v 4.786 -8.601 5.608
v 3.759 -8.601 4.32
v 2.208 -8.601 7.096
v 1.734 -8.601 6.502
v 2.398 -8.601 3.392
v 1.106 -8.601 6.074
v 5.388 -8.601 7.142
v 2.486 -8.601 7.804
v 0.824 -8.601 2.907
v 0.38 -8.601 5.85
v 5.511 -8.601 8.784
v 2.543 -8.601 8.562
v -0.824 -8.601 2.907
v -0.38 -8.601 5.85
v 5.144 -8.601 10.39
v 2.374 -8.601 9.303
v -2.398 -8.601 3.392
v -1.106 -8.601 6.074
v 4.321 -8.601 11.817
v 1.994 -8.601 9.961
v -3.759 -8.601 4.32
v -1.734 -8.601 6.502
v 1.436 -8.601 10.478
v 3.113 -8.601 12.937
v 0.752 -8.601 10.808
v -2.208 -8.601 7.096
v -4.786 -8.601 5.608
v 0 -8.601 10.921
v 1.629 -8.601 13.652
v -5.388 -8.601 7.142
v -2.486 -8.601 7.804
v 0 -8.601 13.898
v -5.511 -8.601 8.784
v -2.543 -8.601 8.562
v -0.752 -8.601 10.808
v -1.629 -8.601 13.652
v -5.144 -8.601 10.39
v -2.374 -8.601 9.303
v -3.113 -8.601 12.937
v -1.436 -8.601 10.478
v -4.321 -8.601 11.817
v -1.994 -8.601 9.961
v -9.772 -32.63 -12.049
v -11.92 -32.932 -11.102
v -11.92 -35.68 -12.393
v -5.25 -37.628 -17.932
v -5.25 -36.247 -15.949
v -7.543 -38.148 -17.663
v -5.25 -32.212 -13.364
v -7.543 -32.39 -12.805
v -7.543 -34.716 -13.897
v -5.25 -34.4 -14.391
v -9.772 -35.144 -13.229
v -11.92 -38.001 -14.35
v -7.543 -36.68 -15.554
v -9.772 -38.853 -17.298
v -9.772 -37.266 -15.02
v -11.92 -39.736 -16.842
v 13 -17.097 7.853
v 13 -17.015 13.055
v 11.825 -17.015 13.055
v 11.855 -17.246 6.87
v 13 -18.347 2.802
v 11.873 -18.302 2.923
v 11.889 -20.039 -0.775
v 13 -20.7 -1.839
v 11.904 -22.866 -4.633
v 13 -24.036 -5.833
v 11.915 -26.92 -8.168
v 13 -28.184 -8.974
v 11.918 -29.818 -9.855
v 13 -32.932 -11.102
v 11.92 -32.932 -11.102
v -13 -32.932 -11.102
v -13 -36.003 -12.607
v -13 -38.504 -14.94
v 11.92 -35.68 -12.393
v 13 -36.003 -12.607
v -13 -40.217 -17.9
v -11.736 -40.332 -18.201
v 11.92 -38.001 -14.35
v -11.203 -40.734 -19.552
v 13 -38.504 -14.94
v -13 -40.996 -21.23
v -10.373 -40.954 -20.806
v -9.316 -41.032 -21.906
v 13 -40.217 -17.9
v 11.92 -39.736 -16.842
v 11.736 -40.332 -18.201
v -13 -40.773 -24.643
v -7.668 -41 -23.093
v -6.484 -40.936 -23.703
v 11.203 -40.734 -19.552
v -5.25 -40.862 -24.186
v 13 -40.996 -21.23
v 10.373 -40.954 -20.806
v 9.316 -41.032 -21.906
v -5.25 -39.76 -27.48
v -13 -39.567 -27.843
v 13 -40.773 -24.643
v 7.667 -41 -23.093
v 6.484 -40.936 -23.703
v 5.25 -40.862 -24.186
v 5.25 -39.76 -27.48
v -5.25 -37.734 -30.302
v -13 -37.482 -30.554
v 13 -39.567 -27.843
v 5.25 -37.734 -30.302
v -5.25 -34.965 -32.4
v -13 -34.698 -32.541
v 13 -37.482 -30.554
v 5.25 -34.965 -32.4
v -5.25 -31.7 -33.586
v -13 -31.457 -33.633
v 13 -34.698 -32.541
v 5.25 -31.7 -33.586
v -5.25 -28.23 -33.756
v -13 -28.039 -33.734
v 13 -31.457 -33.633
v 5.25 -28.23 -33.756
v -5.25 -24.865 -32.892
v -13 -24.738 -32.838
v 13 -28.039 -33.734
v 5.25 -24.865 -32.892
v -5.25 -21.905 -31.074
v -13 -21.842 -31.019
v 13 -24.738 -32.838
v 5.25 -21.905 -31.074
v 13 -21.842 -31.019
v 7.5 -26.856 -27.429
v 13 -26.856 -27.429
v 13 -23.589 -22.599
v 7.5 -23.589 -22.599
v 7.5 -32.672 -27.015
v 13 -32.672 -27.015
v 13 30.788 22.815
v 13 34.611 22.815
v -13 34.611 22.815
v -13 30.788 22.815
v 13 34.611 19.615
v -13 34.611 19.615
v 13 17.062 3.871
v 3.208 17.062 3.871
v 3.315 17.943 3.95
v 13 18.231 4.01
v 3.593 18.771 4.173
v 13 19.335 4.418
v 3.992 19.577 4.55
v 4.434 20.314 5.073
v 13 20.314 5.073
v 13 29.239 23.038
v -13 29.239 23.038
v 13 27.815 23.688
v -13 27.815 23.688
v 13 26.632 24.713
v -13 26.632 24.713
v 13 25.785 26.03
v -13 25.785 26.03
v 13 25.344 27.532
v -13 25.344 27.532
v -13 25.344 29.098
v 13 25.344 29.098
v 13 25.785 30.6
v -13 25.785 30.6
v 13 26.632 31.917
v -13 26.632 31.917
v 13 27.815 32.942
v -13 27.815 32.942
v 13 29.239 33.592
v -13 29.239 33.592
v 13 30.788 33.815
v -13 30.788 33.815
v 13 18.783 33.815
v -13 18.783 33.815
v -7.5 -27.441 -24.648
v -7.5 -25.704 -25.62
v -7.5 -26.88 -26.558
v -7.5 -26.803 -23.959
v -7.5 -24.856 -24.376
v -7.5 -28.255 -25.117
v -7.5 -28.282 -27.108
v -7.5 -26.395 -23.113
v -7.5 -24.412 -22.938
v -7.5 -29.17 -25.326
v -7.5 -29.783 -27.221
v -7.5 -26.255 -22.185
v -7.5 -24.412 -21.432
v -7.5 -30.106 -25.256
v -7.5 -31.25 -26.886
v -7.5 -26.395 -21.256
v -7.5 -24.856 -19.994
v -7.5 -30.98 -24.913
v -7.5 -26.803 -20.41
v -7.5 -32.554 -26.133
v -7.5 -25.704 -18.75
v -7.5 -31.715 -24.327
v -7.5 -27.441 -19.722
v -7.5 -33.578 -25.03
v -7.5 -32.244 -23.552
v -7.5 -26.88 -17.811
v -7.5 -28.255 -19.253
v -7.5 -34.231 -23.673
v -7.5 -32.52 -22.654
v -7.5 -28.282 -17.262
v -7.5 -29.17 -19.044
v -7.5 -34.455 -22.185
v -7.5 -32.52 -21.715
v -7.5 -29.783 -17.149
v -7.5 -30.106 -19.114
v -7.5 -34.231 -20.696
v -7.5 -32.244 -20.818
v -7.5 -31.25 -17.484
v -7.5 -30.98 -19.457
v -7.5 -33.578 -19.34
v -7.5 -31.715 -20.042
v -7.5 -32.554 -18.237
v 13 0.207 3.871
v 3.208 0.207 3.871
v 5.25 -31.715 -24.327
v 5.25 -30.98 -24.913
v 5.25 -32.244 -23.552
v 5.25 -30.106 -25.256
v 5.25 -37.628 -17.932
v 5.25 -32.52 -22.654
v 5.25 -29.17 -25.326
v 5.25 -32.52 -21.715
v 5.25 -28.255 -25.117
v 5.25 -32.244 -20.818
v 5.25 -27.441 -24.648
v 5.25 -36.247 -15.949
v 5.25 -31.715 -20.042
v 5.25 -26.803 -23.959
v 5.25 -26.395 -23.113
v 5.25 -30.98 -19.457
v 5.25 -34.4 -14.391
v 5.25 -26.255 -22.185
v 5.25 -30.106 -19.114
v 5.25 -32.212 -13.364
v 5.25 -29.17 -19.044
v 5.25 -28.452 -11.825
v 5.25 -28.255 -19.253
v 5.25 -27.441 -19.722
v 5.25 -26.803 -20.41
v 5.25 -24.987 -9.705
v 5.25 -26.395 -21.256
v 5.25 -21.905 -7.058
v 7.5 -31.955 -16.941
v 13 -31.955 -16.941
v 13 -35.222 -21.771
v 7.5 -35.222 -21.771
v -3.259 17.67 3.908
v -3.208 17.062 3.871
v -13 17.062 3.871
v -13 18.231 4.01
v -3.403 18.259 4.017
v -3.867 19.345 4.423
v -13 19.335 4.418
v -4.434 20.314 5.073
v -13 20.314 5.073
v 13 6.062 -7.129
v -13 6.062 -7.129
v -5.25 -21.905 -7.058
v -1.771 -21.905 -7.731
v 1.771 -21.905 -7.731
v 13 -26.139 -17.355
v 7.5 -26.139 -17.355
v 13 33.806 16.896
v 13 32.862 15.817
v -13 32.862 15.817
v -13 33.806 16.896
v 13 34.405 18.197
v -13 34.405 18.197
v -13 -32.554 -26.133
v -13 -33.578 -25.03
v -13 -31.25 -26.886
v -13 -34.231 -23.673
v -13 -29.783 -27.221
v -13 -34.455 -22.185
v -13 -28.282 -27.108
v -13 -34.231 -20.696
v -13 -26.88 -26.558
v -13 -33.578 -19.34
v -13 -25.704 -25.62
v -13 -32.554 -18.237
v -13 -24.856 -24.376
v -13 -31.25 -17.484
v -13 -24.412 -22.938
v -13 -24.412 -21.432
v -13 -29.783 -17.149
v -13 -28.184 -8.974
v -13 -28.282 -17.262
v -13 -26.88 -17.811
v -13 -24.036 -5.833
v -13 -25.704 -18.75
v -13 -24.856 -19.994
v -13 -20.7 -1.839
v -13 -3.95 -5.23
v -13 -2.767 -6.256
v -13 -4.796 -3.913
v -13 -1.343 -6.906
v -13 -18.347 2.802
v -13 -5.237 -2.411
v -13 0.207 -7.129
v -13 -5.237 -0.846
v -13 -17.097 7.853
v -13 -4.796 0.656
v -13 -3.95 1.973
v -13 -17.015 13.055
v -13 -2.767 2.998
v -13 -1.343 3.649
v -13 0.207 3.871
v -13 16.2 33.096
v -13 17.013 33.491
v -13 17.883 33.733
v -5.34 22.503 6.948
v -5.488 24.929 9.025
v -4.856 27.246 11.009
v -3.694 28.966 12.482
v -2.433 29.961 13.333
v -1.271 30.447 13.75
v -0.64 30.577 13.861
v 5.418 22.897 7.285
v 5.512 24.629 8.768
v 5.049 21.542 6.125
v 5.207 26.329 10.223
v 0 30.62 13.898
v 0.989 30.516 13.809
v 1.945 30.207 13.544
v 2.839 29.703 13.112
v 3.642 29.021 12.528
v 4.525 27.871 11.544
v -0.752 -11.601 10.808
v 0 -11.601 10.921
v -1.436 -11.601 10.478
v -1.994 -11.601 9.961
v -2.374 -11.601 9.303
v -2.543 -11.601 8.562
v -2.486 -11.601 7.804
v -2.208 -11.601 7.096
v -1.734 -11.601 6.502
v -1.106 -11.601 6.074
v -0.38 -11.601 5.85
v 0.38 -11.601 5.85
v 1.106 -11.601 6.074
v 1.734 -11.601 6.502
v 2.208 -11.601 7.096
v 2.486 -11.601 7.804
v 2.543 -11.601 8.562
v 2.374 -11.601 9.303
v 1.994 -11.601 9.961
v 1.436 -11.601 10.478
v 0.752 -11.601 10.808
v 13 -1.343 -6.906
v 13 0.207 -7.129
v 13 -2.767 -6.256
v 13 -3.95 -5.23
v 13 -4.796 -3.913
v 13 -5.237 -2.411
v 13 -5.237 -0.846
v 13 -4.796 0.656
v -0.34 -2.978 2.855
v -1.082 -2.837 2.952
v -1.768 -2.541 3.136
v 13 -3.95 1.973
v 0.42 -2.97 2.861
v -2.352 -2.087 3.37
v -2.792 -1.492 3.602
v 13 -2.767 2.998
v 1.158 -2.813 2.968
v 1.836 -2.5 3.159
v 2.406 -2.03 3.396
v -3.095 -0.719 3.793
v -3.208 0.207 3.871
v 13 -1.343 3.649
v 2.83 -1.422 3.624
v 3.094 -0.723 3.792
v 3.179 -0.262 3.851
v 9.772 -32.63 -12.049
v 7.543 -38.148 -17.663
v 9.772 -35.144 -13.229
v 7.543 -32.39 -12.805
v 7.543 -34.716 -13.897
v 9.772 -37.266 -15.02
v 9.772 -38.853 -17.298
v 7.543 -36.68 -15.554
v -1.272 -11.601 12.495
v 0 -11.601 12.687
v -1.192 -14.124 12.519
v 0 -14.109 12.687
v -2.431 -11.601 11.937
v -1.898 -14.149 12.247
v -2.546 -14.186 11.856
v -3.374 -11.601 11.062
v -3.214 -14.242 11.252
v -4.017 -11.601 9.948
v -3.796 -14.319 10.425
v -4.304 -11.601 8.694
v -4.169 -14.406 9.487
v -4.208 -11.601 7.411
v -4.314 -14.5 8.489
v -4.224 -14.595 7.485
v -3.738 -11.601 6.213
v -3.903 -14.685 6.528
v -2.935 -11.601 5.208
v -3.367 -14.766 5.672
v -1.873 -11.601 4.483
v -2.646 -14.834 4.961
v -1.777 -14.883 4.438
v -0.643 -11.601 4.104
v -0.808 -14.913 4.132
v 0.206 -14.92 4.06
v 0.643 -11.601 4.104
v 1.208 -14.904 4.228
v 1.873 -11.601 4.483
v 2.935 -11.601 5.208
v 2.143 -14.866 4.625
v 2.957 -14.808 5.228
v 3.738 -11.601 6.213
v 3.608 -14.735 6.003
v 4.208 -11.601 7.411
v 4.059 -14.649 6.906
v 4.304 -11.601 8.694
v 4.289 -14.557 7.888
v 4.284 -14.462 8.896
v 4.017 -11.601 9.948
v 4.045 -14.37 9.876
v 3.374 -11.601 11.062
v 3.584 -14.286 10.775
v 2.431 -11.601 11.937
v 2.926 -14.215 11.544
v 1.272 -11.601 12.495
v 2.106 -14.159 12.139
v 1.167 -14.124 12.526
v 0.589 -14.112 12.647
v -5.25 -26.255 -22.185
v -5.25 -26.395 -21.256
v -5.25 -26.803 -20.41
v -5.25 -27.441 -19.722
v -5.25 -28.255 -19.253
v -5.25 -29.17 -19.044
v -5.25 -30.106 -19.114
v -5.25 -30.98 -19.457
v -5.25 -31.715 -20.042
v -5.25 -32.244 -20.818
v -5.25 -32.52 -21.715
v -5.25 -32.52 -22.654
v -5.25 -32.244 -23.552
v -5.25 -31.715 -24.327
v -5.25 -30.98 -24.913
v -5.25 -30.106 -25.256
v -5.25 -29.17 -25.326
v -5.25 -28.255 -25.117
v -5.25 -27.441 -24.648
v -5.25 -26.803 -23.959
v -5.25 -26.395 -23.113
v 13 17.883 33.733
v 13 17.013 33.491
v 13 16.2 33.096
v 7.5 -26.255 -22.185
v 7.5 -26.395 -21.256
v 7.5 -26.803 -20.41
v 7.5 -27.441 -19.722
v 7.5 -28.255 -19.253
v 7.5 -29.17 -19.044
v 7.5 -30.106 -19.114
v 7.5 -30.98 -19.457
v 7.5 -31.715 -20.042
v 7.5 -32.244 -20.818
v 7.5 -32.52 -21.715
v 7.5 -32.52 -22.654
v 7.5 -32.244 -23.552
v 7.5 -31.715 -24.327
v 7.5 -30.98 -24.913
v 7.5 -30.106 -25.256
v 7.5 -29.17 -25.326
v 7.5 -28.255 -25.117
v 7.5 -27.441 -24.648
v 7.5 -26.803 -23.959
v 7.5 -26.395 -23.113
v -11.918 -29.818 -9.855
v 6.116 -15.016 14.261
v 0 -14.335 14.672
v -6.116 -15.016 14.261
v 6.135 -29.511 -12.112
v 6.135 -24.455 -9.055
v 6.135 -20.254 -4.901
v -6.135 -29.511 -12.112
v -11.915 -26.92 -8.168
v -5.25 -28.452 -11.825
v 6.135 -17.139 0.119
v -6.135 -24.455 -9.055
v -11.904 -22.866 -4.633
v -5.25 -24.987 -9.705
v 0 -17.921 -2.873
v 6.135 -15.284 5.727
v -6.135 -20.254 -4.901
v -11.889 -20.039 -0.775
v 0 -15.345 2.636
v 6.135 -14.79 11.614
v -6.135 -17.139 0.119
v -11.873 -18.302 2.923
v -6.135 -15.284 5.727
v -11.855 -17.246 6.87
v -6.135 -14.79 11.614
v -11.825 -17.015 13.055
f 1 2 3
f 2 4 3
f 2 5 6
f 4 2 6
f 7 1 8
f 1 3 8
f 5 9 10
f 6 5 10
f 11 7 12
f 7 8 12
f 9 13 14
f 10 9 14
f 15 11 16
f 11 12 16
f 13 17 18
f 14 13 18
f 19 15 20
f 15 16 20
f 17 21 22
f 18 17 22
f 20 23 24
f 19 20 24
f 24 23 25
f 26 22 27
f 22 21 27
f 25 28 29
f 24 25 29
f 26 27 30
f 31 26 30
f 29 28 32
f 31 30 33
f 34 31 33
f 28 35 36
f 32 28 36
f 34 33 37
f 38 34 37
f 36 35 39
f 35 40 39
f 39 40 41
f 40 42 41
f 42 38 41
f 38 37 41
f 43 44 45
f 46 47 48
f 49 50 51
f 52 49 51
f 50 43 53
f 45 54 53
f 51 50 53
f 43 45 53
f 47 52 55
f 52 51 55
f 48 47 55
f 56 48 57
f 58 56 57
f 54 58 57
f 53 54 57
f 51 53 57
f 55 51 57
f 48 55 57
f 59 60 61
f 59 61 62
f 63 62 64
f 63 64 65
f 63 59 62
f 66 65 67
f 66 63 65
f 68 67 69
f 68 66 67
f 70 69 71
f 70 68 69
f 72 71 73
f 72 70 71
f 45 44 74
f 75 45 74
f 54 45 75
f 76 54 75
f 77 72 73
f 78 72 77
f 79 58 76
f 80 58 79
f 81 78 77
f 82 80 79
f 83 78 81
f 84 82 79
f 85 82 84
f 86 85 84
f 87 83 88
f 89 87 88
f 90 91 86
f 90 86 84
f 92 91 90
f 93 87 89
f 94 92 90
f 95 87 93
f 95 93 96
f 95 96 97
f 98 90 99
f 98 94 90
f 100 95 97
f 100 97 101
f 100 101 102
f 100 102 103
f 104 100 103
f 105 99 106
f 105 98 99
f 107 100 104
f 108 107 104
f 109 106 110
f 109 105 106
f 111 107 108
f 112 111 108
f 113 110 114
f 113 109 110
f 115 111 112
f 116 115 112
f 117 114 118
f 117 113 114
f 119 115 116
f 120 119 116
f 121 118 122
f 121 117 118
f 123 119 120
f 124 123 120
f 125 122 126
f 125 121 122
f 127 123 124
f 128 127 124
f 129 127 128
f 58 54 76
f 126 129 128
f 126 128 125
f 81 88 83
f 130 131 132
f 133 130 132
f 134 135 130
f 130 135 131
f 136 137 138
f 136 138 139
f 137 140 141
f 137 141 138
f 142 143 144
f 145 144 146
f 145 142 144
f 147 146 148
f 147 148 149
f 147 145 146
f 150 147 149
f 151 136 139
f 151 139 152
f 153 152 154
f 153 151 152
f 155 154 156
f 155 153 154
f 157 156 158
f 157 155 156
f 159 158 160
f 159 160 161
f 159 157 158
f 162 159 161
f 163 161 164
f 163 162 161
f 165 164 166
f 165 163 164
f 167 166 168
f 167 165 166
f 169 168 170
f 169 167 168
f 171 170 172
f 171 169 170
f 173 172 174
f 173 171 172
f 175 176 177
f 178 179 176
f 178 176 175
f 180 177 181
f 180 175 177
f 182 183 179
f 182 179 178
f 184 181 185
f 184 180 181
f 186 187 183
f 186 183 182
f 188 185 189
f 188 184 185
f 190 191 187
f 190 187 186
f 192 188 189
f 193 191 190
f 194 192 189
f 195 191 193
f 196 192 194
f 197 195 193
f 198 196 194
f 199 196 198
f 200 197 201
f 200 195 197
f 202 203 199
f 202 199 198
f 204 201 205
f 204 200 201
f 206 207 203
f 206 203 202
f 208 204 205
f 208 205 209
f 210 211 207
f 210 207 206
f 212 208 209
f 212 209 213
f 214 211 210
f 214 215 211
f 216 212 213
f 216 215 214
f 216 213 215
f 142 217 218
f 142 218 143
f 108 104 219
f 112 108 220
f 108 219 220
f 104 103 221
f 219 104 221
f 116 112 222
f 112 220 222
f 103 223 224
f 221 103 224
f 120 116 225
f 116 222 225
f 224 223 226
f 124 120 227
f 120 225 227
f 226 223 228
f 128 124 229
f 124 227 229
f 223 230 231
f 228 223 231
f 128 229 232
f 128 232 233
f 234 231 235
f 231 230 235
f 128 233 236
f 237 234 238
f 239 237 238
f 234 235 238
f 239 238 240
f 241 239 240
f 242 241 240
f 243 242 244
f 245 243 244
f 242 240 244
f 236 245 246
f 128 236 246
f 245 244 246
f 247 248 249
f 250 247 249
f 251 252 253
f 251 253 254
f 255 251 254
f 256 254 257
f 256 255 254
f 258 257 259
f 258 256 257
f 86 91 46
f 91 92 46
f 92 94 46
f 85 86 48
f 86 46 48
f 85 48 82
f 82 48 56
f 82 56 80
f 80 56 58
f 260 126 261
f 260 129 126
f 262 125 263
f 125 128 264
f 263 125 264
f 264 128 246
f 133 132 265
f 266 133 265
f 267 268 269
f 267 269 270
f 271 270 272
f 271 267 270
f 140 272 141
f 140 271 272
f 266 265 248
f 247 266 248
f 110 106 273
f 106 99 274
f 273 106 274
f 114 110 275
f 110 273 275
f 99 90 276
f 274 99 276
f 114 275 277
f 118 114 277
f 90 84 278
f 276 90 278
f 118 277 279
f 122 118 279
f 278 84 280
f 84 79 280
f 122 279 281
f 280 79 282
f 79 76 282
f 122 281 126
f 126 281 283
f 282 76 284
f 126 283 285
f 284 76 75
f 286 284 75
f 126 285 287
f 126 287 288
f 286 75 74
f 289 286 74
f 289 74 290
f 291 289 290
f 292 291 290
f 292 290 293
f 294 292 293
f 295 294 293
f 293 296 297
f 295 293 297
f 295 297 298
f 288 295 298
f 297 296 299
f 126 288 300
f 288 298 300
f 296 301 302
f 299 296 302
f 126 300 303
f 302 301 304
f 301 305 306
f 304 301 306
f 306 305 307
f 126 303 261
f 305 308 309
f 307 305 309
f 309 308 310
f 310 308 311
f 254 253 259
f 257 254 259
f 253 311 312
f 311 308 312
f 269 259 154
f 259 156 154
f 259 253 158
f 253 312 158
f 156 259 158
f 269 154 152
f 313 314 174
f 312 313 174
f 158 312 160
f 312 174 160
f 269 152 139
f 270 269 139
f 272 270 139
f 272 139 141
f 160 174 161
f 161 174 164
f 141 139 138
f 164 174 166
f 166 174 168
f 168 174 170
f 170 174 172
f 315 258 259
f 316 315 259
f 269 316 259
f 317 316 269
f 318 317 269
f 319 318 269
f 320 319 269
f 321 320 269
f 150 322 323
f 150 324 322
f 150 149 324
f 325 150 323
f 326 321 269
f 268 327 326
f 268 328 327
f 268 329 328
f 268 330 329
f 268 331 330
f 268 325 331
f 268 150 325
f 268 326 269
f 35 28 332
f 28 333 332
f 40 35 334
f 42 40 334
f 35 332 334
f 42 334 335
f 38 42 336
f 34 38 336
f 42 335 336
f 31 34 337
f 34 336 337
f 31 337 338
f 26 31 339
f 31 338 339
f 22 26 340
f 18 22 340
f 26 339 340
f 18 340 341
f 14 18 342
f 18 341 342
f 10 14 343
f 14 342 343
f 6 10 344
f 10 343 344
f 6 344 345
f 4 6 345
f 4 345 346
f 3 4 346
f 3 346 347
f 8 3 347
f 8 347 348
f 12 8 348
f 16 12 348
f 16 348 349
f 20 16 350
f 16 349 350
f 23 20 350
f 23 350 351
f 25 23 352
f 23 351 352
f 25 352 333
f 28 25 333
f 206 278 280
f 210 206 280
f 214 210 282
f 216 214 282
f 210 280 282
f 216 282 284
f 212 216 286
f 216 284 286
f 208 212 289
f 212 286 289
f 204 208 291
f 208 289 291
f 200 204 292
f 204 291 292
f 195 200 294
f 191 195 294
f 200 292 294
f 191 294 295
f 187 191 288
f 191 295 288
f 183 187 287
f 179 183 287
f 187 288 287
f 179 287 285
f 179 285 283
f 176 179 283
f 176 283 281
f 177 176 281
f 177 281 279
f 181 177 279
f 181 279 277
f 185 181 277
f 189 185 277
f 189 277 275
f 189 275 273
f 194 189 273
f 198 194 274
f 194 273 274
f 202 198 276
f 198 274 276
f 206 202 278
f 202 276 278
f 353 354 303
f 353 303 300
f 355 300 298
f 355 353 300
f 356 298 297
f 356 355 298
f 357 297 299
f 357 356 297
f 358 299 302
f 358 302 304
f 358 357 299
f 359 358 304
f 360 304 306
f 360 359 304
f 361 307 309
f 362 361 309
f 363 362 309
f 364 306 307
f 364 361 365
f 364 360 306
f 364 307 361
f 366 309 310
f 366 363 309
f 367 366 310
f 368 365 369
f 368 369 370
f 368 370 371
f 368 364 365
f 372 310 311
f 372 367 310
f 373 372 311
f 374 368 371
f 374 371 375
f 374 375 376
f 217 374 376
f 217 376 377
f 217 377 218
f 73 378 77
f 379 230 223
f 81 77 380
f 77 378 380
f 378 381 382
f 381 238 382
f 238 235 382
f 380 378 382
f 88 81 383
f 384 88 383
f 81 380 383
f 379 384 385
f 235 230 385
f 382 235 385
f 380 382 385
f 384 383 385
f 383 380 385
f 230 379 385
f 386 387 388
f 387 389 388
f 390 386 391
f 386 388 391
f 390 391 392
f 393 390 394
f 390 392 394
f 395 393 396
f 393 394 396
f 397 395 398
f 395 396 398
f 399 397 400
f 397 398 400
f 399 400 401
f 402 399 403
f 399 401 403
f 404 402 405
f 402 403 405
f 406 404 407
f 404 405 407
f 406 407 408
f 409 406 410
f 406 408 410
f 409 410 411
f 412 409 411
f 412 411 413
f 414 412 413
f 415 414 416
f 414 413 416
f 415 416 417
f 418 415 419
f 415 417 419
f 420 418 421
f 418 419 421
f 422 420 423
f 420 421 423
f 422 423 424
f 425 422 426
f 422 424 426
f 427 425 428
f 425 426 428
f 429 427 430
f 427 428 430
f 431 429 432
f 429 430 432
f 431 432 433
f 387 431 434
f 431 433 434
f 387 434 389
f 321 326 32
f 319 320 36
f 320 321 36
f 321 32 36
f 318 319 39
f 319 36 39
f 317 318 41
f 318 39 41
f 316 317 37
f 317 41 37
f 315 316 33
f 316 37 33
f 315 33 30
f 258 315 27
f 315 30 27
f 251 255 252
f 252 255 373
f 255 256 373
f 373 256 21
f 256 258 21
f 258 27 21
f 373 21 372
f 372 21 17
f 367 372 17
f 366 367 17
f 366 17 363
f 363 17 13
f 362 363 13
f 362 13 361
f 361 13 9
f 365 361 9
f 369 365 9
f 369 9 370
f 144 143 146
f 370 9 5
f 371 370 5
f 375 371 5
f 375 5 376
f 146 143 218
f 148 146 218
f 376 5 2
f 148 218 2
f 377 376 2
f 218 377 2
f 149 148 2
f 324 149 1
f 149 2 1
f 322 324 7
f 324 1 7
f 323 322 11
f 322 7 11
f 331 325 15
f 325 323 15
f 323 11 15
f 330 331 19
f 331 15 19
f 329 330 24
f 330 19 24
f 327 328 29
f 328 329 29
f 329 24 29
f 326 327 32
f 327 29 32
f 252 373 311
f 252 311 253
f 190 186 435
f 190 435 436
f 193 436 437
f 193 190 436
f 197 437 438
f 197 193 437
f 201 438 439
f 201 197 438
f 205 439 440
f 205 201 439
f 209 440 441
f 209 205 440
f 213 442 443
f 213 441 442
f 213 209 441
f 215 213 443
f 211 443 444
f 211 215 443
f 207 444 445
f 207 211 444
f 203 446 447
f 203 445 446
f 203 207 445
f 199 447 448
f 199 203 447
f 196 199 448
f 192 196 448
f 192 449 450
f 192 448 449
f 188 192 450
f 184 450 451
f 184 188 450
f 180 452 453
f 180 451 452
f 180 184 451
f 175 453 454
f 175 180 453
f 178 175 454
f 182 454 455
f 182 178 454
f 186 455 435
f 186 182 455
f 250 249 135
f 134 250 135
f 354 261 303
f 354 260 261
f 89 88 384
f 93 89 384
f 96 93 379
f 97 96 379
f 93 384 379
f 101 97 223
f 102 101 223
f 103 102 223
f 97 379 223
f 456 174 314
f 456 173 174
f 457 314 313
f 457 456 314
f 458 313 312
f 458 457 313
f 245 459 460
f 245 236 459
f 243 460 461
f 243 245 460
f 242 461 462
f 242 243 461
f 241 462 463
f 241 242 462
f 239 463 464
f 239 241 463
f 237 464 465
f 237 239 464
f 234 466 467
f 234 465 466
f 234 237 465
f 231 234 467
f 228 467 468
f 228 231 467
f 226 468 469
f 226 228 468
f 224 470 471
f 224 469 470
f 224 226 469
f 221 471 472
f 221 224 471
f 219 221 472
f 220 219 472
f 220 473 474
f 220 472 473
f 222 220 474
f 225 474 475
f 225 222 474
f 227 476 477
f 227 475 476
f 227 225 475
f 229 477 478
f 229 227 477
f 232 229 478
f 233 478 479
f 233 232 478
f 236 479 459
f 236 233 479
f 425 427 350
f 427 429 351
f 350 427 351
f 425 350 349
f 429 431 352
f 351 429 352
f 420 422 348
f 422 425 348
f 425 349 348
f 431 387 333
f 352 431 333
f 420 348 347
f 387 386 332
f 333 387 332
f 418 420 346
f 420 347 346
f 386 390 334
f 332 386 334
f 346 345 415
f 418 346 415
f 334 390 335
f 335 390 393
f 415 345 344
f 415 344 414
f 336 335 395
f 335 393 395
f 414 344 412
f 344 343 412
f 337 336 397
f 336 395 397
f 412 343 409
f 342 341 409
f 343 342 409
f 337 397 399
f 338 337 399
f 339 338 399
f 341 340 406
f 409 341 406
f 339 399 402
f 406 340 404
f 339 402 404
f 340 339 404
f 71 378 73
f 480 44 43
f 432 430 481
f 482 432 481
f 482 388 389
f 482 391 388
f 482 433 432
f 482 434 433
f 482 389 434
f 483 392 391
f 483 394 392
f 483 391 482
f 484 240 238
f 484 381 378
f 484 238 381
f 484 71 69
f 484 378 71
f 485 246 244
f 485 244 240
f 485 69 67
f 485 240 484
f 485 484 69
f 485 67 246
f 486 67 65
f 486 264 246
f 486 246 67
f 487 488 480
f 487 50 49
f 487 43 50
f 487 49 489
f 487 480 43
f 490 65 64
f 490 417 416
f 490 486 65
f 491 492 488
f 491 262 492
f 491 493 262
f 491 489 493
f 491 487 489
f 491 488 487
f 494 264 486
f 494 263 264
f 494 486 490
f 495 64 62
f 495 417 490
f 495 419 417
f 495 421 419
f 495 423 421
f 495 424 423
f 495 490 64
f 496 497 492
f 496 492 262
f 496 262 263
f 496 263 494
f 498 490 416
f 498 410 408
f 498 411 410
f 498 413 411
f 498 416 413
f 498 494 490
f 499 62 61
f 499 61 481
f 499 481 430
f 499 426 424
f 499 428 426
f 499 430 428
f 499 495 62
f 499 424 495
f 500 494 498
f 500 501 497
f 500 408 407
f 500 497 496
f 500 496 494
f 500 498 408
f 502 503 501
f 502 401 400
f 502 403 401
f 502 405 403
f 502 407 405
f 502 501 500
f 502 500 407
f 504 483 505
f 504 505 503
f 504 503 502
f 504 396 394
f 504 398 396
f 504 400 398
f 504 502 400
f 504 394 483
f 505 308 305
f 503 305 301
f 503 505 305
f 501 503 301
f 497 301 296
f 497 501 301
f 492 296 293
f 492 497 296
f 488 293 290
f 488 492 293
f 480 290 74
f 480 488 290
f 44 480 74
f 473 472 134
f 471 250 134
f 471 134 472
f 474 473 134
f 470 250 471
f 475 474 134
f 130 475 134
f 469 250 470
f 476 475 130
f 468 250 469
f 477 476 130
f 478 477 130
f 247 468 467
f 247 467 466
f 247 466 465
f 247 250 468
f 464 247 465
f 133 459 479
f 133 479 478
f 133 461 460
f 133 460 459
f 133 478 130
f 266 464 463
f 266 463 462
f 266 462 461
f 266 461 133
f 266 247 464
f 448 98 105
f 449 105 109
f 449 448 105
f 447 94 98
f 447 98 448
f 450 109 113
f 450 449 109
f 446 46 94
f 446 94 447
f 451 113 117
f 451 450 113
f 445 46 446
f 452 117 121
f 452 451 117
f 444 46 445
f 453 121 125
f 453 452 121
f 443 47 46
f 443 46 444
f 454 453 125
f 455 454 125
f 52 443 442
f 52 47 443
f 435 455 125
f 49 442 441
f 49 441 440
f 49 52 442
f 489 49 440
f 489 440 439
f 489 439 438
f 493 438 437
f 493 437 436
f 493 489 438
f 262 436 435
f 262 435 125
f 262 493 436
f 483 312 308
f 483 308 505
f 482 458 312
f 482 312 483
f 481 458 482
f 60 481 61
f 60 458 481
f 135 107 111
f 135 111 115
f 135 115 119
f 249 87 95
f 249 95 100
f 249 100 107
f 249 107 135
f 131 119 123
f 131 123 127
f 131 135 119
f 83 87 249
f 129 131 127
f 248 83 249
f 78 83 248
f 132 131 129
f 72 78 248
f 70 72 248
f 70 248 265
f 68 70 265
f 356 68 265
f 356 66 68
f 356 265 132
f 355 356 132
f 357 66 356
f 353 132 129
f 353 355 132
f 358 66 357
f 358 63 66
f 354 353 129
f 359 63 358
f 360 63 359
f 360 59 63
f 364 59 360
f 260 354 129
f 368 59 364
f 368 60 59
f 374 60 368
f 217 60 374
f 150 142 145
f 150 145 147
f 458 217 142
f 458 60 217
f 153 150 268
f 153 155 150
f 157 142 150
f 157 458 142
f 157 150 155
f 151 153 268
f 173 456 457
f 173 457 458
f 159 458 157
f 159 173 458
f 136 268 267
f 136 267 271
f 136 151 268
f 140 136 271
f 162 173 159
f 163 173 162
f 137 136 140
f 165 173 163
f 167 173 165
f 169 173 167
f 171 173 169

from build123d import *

# Parameters (mm, degrees)
F0_R      = 3.15
F1_DEPTH  = 13
F3_DEPTH  = 5.25
F5_DEPTH  = 5.5
F6_R      = 5.05
F7_DEPTH  = 5.5
F13_ANGLE = 45
F14_DEPTH = 15.67431457


# Not quite as in the source:
# - ends of sketch curves that miss each other by under 0.0002 mm in the source are joined


with BuildPart() as f1:
    # F0 (on Right) → F1 (new body, symmetric)
    with BuildSketch(Plane.YZ):
        with BuildLine():
            ThreePointArc((0.206929, -7.128644), (-5.293071, -1.628644), (0.206929, 3.871356))
            Line((0.206929, 3.871356), (17.0618508568, 3.871356))
            ThreePointArc((17.0618508568, 3.871356), (18.7952856408, 4.1814515394), (20.3137082671, 5.0732744602))
            Line((20.3137082671, 5.0732744602), (32.8624566897, 15.8173146076))
            ThreePointArc((32.8624566897, 15.8173146076), (34.1525860171, 17.5248563908), (34.6105992794, 19.6153961475))
            Line((34.6105992794, 19.6153961475), (34.6105992794, 22.815095))
            Line((34.6105992794, 22.815095), (30.788173, 22.815095))
            ThreePointArc((30.788173, 22.815095), (25.288173, 28.315095), (30.788173, 33.815095))
            Line((30.788173, 33.815095), (18.7829781294, 33.815095))
            ThreePointArc((18.7829781294, 33.815095), (17.4423484261, 33.6320143473), (16.1998960673, 33.0961797995))
            Line((16.1998960673, 33.0961797995), (-17.01485, 13.055368))
            ThreePointArc((-17.01485, 13.055368), (-20.6995911511, -1.839295663), (-32.9318010984, -11.1021976908))
            ThreePointArc((-32.9318010984, -11.1021976908), (-39.5666476125, -27.8428278397), (-21.8415422013, -31.0193857649))
            Line((-21.8415422013, -31.0193857649), (6.062198, -7.128644))
            Line((6.062198, -7.128644), (0.206929, -7.128644))
        make_face()
        with Locations((-29.405486, -22.184905)):
            Circle(F0_R, mode=Mode.SUBTRACT)
    extrude(amount=F1_DEPTH, both=True)

    # F2 (on Right) → F3 (cut, symmetric)
    with BuildSketch(Plane.YZ):
        with BuildLine():
            ThreePointArc((-21.905486, -3.502726), (-26.8533127567, -8.1227182817), (-32.9318011292, -11.1021976663))
            ThreePointArc((-32.9318011292, -11.1021976663), (-39.5869945241, -27.806130876), (-21.905486, -31.0737348541))
            Line((-21.905486, -31.0737348541), (-21.905486, -3.502726))
        make_face()
    extrude(amount=F3_DEPTH, both=True, mode=Mode.SUBTRACT)

    # F4 (on face) → F5 (cut)
    with BuildSketch(Plane.YZ.offset(13)):
        Polygon((-26.8555401867, -27.4290550439), (-23.5889459341, -22.5986621693), (-26.1388917474, -17.3545121255), (-31.9554318133, -16.9407549561), (-35.2220260659, -21.7711478307), (-32.6720802526, -27.0152978745), align=None)
    extrude(amount=-F5_DEPTH, mode=Mode.SUBTRACT)

    # F6 (on face) → F7 (cut)
    with BuildSketch(Plane(origin=(-13, 0, 0), x_dir=(0, -1, 0), z_dir=(-1, 0, 0))):
        with Locations((29.405486, -22.184905)):
            Circle(F6_R)
    extrude(amount=-F7_DEPTH, mode=Mode.SUBTRACT)

    # F8 (on Right) → F9 (revolve, cut)
    with BuildSketch(Plane.YZ):
        Polygon((30.9979878552, 13.8976717895), (-8.6011026711, 13.8976717895), (-8.6011026711, 10.921356), (-11.6011026711, 10.921356), (-11.6011026711, 12.6871454737), (-20.2870493605, 12.6871454737), (-20.375526354, 8.371356), (30.9979878552, 8.371356), align=None)
    revolve(axis=Axis((0, 5.3112307506, 8.371356), (0, -1, 0)), mode=Mode.SUBTRACT)

    # F11 (on 3pt) → F12 (revolve, cut)
    with BuildSketch(Plane(origin=(0, -33.1120649043, -10.535657015), x_dir=(-1, 0, 0), z_dir=(0, 0.95292578, 0.3032036573))):
        with BuildLine():
            Line((13, 0), (-13, 0))
            ThreePointArc((-13, 0), (0, -3.5066758251), (13, 0))
        make_face()
    revolve(axis=Axis((6.7580873147, -39.8867132027, 10.75609478), (1, 0, 0)), mode=Mode.SUBTRACT)

    # F11 (on 3pt) → F13 (revolve, cut)
    with BuildSketch(Plane(origin=(0, -33.1120649043, -10.535657015), x_dir=(-1, 0, 0), z_dir=(0, 0.95292578, 0.3032036573))):
        with BuildLine():
            Line((13, 0), (-13, 0))
            ThreePointArc((-13, 0), (0, -3.5066758251), (13, 0))
        make_face()
    revolve(axis=Axis((6.5, -29.405486, -22.184905), (1, 0, 0)), revolution_arc=F13_ANGLE, mode=Mode.SUBTRACT)

    # F14 (cut, through all): faces of the model
    f14_faces = [f1.faces().sort_by_distance(p)[0] for p in [
        (-7.6184233171, -38.9779934398, -17.2336080484),
        (7.6184233311, -38.9779934508, -17.2336080427),
    ]]
    extrude(f14_faces, amount=-F14_DEPTH, mode=Mode.SUBTRACT)


solid = f1.part
